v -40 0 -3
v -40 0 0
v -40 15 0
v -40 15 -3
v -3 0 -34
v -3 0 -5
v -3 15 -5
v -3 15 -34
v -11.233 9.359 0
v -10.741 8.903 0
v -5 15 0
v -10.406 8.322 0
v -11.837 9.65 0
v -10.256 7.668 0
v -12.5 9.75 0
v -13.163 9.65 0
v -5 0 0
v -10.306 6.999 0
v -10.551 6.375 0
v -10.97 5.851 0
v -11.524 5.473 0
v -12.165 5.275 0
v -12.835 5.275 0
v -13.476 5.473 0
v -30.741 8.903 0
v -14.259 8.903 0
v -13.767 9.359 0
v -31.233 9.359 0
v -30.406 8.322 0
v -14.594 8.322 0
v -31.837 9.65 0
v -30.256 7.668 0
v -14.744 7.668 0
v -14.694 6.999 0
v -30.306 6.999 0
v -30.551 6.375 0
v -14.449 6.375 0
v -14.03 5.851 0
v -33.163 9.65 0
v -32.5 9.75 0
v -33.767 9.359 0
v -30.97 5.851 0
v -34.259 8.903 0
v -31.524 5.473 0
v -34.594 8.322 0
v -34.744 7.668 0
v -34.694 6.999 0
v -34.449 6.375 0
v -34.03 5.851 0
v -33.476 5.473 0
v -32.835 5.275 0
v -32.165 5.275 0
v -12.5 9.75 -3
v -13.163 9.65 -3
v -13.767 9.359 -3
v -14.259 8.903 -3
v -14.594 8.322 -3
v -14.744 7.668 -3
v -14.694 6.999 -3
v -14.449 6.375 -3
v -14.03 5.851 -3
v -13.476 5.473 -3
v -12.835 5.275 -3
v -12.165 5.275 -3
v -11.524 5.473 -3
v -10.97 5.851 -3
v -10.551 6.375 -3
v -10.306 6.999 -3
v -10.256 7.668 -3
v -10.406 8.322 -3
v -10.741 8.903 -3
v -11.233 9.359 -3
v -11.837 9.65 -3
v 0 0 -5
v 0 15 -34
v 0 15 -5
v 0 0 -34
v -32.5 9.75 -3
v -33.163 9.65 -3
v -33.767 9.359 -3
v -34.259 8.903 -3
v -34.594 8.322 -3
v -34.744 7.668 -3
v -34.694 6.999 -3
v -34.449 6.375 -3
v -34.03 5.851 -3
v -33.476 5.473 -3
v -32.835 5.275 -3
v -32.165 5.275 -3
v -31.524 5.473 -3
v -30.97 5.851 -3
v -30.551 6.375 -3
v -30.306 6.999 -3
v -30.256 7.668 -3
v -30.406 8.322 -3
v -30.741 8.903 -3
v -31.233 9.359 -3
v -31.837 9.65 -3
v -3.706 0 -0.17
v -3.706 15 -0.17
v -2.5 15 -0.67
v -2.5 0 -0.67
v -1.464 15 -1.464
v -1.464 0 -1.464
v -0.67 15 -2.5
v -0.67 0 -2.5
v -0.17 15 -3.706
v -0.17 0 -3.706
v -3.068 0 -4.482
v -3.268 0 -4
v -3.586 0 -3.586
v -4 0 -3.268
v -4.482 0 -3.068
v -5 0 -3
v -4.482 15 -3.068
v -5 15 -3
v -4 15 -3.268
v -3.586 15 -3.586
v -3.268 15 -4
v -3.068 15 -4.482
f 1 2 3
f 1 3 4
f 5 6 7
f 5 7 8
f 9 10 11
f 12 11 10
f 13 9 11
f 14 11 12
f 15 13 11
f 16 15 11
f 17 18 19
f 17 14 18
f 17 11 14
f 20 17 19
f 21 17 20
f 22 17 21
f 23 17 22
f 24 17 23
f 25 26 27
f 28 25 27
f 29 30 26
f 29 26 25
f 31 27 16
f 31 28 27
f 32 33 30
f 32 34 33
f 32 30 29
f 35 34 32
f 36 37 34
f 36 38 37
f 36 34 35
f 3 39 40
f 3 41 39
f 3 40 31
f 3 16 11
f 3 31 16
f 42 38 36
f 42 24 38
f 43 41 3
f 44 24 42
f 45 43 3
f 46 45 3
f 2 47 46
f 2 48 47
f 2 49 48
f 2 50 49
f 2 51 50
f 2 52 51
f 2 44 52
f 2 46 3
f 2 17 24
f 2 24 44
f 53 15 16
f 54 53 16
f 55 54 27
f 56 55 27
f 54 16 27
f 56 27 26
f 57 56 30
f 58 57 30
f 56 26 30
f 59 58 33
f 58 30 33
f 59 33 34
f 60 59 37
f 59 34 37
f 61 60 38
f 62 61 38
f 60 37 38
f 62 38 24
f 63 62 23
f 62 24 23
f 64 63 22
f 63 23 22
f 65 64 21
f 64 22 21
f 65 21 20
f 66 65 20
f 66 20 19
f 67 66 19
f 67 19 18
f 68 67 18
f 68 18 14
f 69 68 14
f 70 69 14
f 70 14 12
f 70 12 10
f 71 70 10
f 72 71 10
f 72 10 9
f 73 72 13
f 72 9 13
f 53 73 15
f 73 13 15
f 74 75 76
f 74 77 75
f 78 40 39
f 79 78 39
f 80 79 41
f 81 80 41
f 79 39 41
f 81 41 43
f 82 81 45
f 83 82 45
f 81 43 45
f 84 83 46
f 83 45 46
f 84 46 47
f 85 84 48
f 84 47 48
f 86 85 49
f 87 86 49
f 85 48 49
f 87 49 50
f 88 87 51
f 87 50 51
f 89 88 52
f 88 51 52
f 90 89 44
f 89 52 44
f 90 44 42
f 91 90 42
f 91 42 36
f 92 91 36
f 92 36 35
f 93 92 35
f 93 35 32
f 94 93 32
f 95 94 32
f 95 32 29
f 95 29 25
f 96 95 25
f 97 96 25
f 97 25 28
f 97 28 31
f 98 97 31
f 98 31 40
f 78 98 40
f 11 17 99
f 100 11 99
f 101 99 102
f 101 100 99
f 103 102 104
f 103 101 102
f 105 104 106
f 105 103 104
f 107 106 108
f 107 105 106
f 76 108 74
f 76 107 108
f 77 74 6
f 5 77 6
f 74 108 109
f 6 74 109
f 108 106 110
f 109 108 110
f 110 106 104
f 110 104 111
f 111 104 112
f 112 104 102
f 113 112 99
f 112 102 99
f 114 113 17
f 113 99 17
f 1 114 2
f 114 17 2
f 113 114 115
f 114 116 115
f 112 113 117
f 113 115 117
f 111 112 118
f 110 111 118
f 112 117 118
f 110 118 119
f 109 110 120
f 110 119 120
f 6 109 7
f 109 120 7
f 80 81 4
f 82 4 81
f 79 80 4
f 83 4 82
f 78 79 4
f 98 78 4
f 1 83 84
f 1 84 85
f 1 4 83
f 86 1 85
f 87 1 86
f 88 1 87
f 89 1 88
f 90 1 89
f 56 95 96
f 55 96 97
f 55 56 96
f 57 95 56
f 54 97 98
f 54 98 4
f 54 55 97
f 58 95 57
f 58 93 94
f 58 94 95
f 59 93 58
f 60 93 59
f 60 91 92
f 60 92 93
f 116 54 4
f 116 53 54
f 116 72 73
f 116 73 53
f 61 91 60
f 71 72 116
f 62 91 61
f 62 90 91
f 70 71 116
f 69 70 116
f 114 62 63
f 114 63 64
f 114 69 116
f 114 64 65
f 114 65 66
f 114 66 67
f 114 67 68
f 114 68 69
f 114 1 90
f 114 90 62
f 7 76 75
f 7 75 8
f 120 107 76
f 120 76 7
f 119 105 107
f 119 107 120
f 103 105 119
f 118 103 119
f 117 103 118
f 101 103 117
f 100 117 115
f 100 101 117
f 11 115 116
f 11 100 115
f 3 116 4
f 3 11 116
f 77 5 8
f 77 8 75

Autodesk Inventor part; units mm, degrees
ref_plane "YZ Plane" through (0, 0, 0) normal (1, 0, 0) x (0, 1, 0)
ref_plane "XZ Plane" through (0, 0, 0) normal (0, 1, 0) x (-1, 0, 0)
ref_plane "XY Plane" through (0, 0, 0) normal (0, 0, 1) x (1, 0, 0)
sketch "Sketch1" plane through (0, 0, 0) normal (0, 1, 0) x (-1, 0, 0)
  line L0 (0, 0) -> (40, 0)
  line L1 (40, 0) -> (40, -3)
  line L2 (40, -3) -> (0, -3)
  line L3 (0, -3) -> (0, 0)
  line L4 (0, 0) -> (3, 0)
  line L5 (3, 0) -> (3, -34)
  line L6 (3, -34) -> (0, -34)
  line L7 (0, -34) -> (0, 0)
  dimension "d0" = 3
  dimension "d1" = 3
  dimension "d2" = 40
  dimension "d3" = 34
extrude "Extrusion1" add sketch "Sketch1" along normal blind 15
fillet "Fillet1" radius 2 1 edges at (-3, 7.5, -3)
fillet "Fillet2" radius 5 1 edges at (0, 7.5, 0)
sketch "Sketch3" plane through (-40, 0, -3) normal (0, 0, -1) x (-1, 0, 0)
  line L0 (-35, 15) -> (0, 15) projected
  line L1 (-35, 0) -> (0, 0) projected
  line L2 (0, 0) -> (0, 15) projected
  line L3 (-40, 0) -> (-40, 15) projected
  line L4 (-40, 0) -> (-40, 15) projected
  point P0 (-7.5, 7.5)
  point P1 (-27.5, 7.5)
  dimension "d20" = 7.5
  dimension "d29" = 7.5
  dimension "d33" = 12.5
hole "Hole2" at (-32.5, 7.5, -3) at (-12.5, 7.5, -3) direction (0, 0, 1) diameter 4.5 end through all clearance for "Socket Head Cap Screw" size "M4" standard "Ansi Metric M Profile"
equation "\"d1\" = d0"
equation "\"d20\" = d19"
equation "\"d19\" = 7.5"
properties part number "Pancake_Floor Bracket" material "Aluminum 6061"
